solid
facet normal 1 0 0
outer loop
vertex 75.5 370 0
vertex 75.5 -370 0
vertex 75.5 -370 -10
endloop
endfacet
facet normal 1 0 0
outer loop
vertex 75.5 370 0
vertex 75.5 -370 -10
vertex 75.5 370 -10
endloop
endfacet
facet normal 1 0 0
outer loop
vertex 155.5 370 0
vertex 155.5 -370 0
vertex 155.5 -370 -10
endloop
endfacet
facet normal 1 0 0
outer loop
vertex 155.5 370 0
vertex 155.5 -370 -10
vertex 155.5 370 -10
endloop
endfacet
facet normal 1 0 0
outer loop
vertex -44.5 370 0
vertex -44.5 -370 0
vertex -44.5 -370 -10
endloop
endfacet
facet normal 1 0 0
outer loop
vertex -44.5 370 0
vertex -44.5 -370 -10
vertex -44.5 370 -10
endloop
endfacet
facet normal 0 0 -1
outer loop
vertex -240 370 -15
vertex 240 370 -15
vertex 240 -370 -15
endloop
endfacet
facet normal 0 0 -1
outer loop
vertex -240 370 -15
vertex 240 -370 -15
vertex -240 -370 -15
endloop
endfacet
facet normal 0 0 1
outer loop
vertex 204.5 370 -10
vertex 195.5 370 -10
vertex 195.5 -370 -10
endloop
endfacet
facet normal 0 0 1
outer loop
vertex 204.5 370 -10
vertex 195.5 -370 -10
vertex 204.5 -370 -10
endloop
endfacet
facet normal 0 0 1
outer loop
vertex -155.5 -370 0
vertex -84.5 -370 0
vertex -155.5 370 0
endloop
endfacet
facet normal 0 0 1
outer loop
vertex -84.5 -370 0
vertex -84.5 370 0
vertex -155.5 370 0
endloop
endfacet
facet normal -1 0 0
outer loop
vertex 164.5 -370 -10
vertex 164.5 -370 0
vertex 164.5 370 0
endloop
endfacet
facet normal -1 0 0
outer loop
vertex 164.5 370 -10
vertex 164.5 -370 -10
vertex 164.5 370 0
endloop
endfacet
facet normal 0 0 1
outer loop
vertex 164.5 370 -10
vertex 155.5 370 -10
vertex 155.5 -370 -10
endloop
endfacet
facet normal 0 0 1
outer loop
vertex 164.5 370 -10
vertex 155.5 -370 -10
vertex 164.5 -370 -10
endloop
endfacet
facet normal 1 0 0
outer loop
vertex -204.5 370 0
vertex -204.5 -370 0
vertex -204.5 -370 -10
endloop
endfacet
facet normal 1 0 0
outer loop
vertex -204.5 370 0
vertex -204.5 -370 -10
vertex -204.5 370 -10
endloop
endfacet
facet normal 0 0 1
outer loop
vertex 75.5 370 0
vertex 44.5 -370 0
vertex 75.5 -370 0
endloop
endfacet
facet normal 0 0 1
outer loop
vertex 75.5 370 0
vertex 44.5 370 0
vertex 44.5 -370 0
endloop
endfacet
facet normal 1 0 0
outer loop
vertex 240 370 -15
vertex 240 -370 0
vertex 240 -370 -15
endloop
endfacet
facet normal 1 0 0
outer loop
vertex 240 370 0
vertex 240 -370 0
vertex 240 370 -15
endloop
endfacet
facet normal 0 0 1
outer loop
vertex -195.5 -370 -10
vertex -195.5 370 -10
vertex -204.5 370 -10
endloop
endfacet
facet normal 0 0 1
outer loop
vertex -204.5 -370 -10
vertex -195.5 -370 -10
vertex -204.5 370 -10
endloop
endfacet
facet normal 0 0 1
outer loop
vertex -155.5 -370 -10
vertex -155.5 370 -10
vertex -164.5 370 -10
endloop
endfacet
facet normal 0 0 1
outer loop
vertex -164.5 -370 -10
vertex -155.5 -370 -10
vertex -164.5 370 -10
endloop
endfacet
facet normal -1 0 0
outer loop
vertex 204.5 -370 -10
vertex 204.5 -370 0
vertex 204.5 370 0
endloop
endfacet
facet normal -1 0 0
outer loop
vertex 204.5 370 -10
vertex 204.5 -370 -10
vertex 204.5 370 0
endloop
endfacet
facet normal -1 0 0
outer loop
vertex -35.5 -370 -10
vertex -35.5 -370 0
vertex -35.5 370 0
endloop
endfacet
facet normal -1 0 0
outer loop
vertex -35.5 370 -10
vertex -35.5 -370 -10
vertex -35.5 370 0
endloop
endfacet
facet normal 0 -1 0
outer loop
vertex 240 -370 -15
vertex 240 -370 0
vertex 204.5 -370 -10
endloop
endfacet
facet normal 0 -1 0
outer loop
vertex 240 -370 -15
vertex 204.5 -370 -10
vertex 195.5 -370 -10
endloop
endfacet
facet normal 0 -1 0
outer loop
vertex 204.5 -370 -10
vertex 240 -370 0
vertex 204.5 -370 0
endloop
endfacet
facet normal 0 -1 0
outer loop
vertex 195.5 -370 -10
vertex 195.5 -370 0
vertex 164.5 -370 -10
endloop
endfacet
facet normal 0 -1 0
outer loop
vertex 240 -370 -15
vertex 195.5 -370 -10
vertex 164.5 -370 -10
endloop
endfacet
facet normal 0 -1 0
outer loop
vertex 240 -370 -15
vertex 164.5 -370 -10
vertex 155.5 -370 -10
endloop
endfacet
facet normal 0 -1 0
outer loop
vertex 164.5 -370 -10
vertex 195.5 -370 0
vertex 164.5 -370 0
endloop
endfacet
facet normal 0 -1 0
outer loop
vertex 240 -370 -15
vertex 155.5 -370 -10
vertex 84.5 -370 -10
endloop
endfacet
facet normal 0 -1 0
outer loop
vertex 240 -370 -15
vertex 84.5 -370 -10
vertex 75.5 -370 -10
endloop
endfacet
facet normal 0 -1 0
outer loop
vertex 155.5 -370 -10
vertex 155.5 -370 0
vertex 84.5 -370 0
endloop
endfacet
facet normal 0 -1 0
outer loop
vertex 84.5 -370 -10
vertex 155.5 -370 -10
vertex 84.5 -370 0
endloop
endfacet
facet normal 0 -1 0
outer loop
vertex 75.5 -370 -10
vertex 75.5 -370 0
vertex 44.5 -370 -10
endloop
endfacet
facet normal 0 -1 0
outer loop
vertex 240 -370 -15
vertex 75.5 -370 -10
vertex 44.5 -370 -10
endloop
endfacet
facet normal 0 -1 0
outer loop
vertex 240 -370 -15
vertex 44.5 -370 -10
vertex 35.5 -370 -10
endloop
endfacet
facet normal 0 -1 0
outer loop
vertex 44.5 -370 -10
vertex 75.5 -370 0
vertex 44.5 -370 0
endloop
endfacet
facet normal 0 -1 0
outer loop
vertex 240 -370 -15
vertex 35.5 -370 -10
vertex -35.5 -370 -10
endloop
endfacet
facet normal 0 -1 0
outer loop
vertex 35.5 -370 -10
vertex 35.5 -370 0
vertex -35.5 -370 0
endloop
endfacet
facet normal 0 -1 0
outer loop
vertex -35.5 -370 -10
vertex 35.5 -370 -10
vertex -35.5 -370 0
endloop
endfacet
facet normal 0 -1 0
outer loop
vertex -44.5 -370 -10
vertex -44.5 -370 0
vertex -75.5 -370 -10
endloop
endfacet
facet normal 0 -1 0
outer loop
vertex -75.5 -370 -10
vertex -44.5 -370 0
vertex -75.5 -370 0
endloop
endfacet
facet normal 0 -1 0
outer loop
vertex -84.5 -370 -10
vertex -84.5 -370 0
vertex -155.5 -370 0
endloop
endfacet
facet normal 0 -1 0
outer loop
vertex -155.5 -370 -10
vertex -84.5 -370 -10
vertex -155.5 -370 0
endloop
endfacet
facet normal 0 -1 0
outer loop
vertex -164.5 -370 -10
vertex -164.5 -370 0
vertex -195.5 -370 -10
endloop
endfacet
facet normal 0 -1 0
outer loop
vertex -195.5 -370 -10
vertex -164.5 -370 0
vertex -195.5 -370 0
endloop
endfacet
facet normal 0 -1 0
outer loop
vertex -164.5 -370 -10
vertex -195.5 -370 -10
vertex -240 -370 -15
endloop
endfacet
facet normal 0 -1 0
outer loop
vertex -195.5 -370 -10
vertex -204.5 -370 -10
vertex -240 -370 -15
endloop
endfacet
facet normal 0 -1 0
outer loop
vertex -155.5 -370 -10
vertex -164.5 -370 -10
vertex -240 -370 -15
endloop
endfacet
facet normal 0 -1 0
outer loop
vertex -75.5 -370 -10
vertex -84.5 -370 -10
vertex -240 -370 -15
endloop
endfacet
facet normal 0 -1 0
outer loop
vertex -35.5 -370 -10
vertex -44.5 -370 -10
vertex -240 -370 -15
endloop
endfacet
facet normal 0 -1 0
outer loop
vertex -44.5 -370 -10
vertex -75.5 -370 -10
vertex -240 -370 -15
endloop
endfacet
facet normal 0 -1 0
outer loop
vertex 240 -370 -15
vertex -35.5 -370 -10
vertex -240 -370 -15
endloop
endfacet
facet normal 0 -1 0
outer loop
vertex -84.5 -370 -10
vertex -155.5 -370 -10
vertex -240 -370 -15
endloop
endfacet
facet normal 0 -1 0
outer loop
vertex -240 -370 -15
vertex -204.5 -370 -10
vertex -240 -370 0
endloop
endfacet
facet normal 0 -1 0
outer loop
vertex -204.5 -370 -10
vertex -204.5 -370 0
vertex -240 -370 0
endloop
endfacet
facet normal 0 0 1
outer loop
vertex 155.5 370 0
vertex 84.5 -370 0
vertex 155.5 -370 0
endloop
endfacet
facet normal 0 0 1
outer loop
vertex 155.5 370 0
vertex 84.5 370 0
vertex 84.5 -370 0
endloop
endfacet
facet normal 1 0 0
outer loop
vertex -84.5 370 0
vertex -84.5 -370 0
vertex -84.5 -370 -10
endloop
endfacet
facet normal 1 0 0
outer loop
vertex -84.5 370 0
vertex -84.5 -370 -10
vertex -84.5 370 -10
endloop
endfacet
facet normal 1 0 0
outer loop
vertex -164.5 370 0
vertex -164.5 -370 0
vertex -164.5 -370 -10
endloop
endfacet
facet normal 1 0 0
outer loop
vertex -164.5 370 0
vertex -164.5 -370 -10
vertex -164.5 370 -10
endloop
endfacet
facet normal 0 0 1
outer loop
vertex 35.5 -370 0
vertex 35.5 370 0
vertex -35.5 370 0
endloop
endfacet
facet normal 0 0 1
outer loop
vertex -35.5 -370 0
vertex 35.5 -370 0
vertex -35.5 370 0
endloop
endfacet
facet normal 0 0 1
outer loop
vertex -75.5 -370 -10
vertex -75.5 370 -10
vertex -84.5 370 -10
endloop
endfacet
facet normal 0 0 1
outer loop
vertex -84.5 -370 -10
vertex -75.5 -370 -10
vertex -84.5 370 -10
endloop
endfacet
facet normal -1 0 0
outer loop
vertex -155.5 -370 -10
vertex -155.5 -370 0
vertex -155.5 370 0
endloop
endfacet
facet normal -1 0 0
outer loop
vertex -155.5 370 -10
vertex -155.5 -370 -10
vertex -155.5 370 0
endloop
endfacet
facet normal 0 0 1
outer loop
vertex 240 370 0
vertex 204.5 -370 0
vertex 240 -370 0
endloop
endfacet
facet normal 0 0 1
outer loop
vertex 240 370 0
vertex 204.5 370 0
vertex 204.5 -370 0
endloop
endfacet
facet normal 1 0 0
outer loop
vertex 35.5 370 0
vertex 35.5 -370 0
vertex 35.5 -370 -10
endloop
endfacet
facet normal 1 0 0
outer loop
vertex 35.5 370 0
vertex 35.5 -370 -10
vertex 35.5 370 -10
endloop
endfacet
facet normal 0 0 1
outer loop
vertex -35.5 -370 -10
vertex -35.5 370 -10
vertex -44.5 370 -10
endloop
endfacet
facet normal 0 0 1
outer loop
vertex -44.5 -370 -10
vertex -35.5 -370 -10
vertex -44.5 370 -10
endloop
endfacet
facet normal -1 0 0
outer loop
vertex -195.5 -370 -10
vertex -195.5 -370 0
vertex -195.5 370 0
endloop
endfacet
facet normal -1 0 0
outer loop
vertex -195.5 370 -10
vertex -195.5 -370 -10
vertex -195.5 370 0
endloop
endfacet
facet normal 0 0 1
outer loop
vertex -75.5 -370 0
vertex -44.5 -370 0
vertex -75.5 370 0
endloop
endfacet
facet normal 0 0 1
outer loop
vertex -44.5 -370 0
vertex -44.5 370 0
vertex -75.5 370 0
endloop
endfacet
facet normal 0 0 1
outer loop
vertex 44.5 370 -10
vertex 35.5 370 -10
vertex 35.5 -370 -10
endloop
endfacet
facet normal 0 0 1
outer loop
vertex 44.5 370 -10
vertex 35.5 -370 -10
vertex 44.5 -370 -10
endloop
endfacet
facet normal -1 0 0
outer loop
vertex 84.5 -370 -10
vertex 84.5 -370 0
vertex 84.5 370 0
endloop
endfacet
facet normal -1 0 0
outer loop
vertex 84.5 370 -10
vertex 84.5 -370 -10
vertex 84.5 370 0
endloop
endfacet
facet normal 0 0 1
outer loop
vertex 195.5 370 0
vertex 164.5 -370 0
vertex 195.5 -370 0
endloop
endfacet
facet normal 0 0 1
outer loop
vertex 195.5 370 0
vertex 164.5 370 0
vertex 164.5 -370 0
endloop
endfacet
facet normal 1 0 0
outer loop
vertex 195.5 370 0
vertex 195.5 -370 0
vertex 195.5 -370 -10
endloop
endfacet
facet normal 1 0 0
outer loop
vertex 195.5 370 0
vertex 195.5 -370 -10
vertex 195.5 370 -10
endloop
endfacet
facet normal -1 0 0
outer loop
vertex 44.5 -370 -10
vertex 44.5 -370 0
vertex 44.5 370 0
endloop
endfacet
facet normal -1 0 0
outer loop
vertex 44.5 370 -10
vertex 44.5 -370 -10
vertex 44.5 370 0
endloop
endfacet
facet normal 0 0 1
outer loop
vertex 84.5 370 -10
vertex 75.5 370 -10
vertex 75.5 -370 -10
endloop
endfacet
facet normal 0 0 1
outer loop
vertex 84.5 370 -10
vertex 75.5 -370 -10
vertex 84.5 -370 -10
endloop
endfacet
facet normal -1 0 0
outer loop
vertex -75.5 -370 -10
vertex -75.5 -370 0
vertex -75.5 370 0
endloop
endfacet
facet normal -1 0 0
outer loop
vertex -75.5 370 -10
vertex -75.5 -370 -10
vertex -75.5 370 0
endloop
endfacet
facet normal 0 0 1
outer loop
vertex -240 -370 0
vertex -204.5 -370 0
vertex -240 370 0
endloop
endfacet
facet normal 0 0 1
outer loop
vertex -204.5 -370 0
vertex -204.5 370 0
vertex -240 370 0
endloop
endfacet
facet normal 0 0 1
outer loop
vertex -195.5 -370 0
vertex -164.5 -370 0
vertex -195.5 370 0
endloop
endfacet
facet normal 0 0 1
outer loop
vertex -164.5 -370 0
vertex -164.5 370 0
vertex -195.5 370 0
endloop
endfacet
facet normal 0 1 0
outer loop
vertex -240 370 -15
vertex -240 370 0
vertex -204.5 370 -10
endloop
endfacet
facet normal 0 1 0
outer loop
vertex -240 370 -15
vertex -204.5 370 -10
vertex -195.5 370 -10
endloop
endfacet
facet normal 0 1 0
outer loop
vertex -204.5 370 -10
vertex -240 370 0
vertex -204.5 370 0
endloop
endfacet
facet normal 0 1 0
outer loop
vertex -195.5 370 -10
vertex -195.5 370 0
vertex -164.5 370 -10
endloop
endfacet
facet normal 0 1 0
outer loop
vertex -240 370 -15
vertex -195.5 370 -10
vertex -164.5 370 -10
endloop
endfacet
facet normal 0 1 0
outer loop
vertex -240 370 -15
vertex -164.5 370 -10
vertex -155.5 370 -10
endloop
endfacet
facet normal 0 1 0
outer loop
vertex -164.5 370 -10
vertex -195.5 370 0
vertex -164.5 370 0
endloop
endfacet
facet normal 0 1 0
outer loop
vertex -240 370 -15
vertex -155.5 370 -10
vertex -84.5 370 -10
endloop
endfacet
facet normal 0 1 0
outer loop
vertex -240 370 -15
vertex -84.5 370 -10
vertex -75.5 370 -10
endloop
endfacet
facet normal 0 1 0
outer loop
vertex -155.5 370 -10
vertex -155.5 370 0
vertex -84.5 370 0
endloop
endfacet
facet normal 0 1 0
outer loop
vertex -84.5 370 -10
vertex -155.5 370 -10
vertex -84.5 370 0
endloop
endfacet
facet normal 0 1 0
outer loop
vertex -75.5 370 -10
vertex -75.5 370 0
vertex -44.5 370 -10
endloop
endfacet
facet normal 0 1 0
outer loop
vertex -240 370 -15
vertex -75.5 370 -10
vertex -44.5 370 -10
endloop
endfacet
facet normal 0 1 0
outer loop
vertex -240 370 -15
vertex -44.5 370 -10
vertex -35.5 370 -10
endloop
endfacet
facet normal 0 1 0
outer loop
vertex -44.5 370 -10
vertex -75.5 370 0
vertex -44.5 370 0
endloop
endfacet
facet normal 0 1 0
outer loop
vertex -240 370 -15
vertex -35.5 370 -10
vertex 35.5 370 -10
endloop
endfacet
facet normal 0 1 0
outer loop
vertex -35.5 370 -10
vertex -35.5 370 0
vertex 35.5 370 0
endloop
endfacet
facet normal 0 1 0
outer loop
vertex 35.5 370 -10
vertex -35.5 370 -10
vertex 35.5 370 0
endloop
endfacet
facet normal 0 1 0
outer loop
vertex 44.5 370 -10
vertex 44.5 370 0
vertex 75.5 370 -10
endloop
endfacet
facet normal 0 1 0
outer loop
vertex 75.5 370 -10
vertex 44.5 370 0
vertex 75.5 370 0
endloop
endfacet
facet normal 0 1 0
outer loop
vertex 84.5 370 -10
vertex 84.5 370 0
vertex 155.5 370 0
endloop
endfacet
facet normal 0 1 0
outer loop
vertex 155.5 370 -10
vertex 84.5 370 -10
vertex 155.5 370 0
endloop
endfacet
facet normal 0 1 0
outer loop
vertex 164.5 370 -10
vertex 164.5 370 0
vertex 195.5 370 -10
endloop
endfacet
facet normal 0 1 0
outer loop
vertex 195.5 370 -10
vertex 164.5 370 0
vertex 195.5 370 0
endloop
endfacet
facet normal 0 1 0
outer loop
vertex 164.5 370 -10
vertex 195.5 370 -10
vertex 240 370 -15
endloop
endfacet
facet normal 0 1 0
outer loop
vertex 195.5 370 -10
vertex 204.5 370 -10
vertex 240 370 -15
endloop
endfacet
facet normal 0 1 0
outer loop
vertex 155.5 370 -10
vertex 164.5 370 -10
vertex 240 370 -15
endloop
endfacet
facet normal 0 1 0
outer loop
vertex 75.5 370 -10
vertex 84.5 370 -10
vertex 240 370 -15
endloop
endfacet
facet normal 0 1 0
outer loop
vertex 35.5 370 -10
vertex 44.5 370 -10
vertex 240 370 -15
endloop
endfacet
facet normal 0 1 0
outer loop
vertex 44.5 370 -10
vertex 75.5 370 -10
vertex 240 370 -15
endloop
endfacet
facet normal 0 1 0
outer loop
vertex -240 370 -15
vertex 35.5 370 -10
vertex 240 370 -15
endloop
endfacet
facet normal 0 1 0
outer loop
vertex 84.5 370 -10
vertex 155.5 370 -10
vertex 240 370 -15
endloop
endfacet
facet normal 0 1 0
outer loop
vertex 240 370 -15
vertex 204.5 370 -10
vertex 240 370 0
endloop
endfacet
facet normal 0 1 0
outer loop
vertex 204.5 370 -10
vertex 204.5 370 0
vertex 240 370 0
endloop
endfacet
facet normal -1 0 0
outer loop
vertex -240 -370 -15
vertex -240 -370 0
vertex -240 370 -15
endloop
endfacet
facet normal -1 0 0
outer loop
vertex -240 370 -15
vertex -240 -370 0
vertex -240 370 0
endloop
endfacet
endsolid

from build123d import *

# Parameters (mm, degrees)
F0_W     = 31
F0_H     = 740
F0_W_2   = 9
F0_W_3   = 71
F0_W_4   = 35.5
F1_DEPTH = 15
F2_DEPTH = 10


with BuildPart() as f1:
    # F0 (on Top) → F1 (new body)
    with BuildSketch(Plane.XY):
        with Locations((180, 0)):
            Rectangle(F0_W, F0_H)
        with Locations((160, 0)):
            Rectangle(F0_W_2, F0_H)
        with Locations((200, 0)):
            Rectangle(F0_W_2, F0_H)
        with Locations((120, 0)):
            Rectangle(F0_W_3, F0_H)
        with Locations((80, 0)):
            Rectangle(F0_W_2, F0_H)
        with Locations((60, 0)):
            Rectangle(F0_W, F0_H)
        with Locations((40, 0)):
            Rectangle(F0_W_2, F0_H)
        with Locations((222.25, 0)):
            Rectangle(F0_W_4, F0_H)
        with Locations((17.75, 0)):
            Rectangle(F0_W_4, F0_H)
    extrude(amount=-F1_DEPTH)

    # F0 (on Top) → F2 (cut)
    with BuildSketch(Plane.XY):
        with Locations((40, 0)):
            Rectangle(F0_W_2, F0_H)
        with Locations((80, 0)):
            Rectangle(F0_W_2, F0_H)
        with Locations((160, 0)):
            Rectangle(F0_W_2, F0_H)
        with Locations((200, 0)):
            Rectangle(F0_W_2, F0_H)
    extrude(amount=-F2_DEPTH, mode=Mode.SUBTRACT)

    # F3: F1 across face


with BuildPart() as f1_1:
    add(f1.part)
    add(f1.part.mirror(Plane(origin=(0, 0, -7.5), x_dir=(0, -1, 0), z_dir=(-1, 0, 0))))


solid = f1_1.part
